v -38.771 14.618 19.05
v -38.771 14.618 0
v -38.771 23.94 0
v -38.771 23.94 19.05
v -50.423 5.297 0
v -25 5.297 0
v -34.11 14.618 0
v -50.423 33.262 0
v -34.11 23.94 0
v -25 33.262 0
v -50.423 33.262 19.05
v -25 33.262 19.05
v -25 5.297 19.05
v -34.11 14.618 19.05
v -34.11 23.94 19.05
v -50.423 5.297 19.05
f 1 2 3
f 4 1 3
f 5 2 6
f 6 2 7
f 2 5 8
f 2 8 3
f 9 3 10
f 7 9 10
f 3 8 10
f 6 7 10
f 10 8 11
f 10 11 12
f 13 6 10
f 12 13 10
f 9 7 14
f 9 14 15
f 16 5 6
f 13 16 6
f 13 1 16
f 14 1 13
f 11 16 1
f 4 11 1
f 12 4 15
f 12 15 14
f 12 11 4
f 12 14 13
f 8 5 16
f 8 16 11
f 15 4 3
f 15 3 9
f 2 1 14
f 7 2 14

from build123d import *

# Parameters (mm, degrees)
F0_W     = 25.423289
F0_H     = 27.965621
F0_W_2   = 4.660934
F0_H_2   = 9.321874
F1_DEPTH = 6.35
F2_DEPTH = 19.05


with BuildPart() as f1:
    # F0 (on Top) → F1 (new body)
    with BuildSketch(Plane.XY):
        with Locations((-37.71121, 19.279323)):
            Rectangle(F0_W, F0_H)
        with Locations((-36.440052, 19.279326)):
            Rectangle(F0_W_2, F0_H_2, mode=Mode.SUBTRACT)
    extrude(amount=F1_DEPTH)

    # F0 (on Top) → F2 (join)
    with BuildSketch(Plane.XY):
        with Locations((-37.71121, 19.279323)):
            Rectangle(F0_W, F0_H)
        with Locations((-36.440052, 19.279326)):
            Rectangle(F0_W_2, F0_H_2, mode=Mode.SUBTRACT)
    extrude(amount=F2_DEPTH)


solid = f1.part
